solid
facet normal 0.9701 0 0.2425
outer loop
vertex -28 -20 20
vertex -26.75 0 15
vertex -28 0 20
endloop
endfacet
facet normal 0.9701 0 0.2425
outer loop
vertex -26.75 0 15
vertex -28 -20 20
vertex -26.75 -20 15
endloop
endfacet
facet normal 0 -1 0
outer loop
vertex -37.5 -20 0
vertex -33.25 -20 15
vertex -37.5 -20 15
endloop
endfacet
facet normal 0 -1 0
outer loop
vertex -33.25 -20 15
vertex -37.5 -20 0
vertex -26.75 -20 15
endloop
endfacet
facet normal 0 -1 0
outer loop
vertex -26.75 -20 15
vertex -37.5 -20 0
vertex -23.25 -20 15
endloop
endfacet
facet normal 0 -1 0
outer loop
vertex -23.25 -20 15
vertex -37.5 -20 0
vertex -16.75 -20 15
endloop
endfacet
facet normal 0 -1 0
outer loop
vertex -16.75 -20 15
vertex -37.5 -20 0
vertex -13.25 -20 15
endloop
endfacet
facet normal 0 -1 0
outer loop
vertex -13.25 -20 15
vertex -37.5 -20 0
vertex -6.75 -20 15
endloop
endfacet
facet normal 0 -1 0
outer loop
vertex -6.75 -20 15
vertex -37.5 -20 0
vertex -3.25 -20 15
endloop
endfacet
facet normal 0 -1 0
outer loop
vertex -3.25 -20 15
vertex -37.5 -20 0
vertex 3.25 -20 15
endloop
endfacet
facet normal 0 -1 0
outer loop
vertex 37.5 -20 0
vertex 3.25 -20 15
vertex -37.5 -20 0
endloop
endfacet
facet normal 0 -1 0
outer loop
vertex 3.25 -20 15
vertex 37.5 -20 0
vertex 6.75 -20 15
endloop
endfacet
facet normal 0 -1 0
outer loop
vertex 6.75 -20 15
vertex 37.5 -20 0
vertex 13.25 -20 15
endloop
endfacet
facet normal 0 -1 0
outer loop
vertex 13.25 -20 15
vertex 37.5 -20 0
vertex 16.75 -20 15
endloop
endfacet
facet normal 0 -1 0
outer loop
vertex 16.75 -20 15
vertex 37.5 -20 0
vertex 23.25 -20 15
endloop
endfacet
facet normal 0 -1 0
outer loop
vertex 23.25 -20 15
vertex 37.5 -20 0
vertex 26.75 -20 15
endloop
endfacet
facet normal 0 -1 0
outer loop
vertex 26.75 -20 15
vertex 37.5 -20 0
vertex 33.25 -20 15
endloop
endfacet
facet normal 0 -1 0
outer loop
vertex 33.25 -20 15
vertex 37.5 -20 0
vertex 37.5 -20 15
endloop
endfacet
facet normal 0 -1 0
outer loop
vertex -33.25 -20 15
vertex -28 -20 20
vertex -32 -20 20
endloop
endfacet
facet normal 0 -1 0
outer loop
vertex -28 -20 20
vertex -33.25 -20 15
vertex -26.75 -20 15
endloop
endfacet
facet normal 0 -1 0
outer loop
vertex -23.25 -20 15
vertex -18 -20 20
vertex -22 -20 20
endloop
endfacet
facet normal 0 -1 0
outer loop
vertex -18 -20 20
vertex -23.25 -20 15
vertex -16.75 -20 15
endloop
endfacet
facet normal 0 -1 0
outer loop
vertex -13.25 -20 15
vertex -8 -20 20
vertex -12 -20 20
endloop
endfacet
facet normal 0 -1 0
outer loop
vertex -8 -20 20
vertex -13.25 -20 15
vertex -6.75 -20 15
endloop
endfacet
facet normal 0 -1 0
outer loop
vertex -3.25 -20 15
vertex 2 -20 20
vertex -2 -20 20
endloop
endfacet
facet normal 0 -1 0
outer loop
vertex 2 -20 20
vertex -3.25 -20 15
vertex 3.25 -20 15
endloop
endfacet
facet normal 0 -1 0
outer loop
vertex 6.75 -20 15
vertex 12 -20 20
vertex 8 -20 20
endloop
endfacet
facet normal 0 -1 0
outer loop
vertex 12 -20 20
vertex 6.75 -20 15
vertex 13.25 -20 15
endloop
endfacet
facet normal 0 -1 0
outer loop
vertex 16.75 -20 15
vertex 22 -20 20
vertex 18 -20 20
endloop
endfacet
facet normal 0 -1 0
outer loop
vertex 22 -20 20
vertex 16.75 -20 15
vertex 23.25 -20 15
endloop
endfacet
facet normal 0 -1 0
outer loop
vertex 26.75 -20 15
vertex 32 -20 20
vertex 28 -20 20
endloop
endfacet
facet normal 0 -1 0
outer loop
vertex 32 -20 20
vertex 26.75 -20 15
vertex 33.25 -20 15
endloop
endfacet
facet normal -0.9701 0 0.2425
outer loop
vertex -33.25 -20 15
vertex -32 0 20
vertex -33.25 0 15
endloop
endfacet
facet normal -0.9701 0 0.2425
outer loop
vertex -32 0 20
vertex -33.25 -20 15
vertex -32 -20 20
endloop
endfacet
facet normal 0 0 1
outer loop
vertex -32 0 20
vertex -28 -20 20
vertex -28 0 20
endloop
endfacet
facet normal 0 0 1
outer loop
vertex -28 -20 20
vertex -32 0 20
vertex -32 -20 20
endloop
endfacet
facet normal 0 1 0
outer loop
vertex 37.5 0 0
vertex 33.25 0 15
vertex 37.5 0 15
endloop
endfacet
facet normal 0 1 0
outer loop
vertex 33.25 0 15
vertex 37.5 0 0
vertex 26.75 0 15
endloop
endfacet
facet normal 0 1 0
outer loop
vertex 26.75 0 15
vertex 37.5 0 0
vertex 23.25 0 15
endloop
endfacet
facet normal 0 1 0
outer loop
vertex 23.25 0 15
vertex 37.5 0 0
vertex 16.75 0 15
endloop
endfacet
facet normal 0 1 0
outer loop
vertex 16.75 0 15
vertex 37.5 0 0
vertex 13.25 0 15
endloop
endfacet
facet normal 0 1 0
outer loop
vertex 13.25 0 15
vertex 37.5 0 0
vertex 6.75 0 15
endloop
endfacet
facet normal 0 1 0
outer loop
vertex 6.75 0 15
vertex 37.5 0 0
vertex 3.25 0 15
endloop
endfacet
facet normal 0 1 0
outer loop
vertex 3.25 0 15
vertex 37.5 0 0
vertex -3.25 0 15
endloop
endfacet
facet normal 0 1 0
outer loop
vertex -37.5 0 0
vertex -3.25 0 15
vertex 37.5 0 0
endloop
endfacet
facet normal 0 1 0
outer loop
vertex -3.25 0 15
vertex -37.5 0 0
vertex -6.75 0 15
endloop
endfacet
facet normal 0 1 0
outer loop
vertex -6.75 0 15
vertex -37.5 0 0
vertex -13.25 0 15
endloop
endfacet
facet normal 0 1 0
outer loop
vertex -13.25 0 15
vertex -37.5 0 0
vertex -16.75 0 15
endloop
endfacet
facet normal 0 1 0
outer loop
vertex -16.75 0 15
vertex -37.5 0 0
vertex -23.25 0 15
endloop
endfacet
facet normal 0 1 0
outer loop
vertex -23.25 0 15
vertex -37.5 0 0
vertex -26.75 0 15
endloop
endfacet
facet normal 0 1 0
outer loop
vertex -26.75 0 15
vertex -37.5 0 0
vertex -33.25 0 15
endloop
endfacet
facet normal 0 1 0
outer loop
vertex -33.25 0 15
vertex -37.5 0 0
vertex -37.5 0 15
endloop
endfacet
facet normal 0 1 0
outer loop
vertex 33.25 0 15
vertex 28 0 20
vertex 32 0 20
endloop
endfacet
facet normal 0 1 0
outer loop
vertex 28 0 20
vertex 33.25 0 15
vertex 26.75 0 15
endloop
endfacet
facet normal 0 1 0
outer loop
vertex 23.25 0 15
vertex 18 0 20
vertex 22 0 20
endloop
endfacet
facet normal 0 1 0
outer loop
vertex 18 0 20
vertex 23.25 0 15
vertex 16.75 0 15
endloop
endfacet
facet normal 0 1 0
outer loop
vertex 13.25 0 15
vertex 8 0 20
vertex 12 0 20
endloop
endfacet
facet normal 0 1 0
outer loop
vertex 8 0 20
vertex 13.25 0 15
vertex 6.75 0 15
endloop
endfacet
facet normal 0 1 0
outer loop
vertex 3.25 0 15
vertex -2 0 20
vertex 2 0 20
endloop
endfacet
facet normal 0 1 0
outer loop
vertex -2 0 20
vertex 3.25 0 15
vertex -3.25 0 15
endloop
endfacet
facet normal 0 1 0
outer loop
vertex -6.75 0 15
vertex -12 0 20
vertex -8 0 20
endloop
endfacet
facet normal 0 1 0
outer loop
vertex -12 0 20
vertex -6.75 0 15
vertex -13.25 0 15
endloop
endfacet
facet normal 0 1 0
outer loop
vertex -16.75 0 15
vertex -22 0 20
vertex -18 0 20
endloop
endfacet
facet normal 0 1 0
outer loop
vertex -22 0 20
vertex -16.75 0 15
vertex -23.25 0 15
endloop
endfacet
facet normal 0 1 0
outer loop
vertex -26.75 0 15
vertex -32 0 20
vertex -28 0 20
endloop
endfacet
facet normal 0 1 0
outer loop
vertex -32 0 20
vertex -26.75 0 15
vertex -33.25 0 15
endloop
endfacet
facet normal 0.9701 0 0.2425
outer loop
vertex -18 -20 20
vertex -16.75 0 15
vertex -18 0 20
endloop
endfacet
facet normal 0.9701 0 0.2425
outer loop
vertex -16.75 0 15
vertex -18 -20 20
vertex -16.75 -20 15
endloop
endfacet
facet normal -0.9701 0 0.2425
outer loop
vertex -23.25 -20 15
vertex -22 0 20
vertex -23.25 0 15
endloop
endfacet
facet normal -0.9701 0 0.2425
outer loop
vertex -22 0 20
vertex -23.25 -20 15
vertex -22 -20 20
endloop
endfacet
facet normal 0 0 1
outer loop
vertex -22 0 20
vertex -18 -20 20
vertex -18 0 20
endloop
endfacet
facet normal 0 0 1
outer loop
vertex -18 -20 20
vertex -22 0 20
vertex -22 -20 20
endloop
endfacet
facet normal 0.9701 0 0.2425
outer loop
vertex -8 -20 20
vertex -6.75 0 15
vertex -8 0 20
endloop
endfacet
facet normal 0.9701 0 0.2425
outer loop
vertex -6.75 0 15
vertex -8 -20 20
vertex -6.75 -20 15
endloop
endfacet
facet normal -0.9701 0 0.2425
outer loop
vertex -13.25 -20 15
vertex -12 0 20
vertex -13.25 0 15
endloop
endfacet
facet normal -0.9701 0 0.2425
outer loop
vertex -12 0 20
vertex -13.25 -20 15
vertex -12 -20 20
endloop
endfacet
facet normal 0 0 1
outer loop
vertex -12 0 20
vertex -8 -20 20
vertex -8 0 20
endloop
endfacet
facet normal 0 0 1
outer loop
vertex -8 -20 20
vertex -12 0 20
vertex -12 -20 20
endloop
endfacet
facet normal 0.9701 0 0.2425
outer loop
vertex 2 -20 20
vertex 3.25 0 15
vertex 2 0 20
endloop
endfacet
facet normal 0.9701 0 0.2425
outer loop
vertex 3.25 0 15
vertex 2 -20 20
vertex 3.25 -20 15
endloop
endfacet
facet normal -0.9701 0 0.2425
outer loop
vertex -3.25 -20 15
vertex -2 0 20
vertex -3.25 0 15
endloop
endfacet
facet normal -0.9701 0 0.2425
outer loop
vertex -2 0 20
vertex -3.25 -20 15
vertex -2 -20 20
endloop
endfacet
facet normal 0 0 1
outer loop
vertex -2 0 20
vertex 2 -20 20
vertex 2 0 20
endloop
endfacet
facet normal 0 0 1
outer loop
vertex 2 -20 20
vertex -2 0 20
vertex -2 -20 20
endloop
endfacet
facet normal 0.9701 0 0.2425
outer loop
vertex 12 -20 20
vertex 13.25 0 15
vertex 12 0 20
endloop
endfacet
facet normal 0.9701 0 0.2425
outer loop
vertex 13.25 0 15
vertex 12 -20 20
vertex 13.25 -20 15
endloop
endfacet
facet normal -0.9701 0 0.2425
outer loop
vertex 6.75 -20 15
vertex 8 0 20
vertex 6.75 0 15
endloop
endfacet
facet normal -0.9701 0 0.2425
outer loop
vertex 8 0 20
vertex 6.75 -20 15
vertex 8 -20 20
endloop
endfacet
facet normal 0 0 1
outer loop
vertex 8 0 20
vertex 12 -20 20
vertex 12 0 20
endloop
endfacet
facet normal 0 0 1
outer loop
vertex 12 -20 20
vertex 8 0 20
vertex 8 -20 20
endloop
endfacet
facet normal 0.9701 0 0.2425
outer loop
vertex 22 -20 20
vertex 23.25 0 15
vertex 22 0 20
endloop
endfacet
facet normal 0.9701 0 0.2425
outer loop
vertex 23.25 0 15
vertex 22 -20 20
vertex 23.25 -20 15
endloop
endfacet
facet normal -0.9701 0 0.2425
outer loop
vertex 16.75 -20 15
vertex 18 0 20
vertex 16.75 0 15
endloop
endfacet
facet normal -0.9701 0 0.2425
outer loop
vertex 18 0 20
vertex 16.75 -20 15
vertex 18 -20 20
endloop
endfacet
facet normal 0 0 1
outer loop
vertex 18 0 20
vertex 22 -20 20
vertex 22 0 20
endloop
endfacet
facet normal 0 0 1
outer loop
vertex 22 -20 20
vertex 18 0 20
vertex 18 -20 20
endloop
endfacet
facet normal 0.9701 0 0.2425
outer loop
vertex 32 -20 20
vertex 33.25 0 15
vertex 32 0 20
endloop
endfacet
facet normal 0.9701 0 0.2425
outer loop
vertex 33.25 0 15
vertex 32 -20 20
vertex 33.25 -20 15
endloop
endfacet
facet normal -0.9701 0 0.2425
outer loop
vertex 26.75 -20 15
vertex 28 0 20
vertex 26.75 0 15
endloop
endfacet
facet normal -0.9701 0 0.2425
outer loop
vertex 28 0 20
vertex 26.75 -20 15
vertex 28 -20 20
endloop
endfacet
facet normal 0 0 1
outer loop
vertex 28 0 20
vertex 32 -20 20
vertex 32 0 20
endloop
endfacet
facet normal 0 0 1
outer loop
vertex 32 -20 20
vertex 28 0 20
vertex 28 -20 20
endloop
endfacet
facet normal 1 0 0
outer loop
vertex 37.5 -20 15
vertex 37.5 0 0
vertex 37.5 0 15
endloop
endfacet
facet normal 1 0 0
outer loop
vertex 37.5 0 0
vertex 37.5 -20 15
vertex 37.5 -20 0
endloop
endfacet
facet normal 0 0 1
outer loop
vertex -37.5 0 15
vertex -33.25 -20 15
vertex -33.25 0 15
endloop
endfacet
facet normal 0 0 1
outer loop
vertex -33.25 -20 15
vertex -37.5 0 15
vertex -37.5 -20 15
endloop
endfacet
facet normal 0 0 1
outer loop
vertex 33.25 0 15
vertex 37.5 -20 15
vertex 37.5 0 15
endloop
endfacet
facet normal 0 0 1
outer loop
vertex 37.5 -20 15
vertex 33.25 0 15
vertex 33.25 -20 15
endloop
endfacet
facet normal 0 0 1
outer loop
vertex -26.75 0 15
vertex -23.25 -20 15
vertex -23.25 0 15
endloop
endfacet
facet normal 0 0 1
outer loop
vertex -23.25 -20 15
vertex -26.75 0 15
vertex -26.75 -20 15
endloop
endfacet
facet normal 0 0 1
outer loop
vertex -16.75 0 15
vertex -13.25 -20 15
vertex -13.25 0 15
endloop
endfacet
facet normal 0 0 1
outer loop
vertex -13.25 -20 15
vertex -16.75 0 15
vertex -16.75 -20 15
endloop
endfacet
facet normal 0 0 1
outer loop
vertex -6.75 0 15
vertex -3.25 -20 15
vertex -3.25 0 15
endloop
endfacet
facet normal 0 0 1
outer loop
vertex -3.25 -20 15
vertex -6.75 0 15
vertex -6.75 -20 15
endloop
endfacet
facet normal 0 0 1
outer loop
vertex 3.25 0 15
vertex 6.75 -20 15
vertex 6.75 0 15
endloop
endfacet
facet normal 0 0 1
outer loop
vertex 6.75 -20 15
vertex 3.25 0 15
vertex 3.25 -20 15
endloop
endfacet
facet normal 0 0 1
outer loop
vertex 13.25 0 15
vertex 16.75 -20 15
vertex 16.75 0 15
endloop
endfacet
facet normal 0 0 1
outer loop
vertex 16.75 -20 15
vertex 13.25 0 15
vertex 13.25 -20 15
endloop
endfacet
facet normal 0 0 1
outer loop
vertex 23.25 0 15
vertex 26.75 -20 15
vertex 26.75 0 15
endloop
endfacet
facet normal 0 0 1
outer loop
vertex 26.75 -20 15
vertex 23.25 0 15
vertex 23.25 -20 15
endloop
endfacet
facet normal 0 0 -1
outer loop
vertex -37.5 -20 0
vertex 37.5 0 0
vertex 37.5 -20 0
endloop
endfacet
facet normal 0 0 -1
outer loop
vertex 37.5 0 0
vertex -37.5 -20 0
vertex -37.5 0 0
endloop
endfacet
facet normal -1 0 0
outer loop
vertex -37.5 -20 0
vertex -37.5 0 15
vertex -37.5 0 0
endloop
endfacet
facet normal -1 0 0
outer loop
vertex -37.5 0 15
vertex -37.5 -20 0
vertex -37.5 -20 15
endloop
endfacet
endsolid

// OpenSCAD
$fn = 32;

// ----------------------------------------------------------------------
// Toothed rack, 7 teeth
// 10 mm pitch, 5 mm teeth
// ----------------------------------------------------------------------

// --- parameters (mm) ---
bar_w = 20;   // bar width (Y)
bar_h = 15;   // bar height (Z)
teeth = 7;    // number of teeth
pitch = 10;   // tooth pitch
tooth_h = 5;  // tooth height above the bar
root_w = 7;   // tooth width at the root
crest_w = 4;  // tooth width at the crest

// --- derived feature positions (mm) ---
span = (teeth - 1) * pitch;  // = 60   distance between the outer teeth
bar_l = span + root_w + 8;   // = 75   bar length: teeth plus 4 mm at each end
tooth_x = -span / 2;         // = -30   X of the first tooth
height = bar_h + tooth_h;    // = 20   overall height
feature_centers = [
  [tooth_x + 0 * pitch, -bar_w / 2],
  [tooth_x + 1 * pitch, -bar_w / 2],
  [tooth_x + 2 * pitch, -bar_w / 2],
  [tooth_x + 3 * pitch, -bar_w / 2],
  [tooth_x + 4 * pitch, -bar_w / 2],
  [tooth_x + 5 * pitch, -bar_w / 2],
  [tooth_x + 6 * pitch, -bar_w / 2]
];   // tooth centre line, drives the tooth loop

// bar with a rack of teeth, one extruded trapezoium per centre
module rack_tooth() {
  linear_extrude(height = bar_w)
    polygon(points = [
      [0, 0],
      [root_w, 0],
      [root_w / 2 + crest_w / 2, tooth_h + 1],
      [root_w / 2 - crest_w / 2, tooth_h + 1]
    ]);
}

union() {
  translate([-bar_l / 2, -bar_w, 0]) cube([bar_l, bar_w, bar_h]);
  for (centre = feature_centers)
    translate([centre[0] - root_w / 2, 0, bar_h - 1]) rotate([90, 0, 0]) rack_tooth();
}
